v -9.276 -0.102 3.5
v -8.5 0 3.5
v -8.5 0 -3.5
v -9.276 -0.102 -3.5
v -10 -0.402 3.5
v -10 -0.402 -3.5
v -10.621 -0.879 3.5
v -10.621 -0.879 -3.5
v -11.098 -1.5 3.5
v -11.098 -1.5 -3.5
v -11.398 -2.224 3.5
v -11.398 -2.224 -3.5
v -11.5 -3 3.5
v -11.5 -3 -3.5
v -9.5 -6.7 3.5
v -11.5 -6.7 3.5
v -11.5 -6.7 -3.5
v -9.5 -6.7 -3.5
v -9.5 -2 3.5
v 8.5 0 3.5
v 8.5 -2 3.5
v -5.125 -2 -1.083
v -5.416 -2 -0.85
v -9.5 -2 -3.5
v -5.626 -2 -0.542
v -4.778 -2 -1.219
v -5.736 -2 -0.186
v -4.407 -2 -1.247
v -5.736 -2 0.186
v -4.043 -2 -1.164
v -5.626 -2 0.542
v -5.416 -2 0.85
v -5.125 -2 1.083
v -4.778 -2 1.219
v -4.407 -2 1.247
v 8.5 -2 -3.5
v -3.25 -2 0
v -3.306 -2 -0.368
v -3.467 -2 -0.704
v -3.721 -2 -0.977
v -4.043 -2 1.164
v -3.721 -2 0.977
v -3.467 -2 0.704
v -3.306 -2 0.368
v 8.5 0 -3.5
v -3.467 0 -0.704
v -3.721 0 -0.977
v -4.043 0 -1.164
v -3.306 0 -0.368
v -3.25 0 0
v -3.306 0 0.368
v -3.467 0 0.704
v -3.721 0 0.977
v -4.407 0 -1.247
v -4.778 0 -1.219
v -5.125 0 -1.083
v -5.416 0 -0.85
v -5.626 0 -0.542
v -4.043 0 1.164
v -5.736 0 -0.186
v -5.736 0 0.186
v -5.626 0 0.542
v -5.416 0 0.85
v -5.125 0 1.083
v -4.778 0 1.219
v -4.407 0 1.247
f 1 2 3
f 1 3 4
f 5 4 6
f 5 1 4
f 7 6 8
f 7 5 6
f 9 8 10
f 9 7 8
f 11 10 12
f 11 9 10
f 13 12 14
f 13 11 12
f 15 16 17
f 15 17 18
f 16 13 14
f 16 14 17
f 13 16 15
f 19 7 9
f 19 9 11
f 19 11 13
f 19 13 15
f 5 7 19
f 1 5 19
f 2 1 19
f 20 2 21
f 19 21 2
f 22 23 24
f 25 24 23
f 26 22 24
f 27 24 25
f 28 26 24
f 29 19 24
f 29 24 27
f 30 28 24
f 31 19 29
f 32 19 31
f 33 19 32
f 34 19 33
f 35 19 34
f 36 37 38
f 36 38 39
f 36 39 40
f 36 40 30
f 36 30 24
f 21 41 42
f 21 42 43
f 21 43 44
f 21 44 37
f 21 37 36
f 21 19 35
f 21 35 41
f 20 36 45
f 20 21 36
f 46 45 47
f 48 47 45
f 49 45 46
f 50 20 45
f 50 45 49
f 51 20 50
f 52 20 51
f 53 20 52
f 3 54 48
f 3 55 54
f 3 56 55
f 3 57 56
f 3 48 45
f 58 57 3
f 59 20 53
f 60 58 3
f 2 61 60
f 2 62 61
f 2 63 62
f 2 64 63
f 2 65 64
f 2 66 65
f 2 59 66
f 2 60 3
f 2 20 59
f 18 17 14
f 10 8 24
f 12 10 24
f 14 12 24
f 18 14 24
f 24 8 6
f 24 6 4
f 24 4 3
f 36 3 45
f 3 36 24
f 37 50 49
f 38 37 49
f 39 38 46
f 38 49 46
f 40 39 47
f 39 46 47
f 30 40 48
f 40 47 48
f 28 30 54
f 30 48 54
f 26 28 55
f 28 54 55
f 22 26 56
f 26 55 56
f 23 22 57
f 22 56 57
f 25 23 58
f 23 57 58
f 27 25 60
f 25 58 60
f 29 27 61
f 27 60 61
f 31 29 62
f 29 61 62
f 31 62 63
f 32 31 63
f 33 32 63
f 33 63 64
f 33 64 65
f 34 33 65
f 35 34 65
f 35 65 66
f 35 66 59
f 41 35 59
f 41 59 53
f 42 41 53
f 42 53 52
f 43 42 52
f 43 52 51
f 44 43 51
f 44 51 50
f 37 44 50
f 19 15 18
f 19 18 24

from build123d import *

# Parameters (mm, degrees)
EXTRUDE_1_DEPTH   = 3.5
HOLE_WIZARD_M31_D = 2.5


with BuildPart() as part:
    # Эскиз1 → Бобышка-Вытянуть1 (new, symmetric)
    with BuildSketch(Plane.XY):
        with BuildLine():
            Line((8.5, 0), (-8.5, 0))
            ThreePointArc((-8.5, 0), (-10.621320344, -0.878679656), (-11.5, -3))
            Line((-11.5, -3), (-11.5, -6.7))
            Line((-11.5, -6.7), (-9.5, -6.7))
            Line((-9.5, -6.7), (-9.5, -2))
            Line((-9.5, -2), (8.5, -2))
            Line((8.5, -2), (8.5, 0))
        make_face()
    extrude(amount=EXTRUDE_1_DEPTH, both=True)

    # Отверстие обработанное метчиком M31 (through all)
    with Locations(Plane(origin=(0, -2, 0), x_dir=(-1, 0, 0), z_dir=(0, -1, 0))):
        with Locations((4.5, 0)):
            Hole(HOLE_WIZARD_M31_D / 2)


solid = part.part
